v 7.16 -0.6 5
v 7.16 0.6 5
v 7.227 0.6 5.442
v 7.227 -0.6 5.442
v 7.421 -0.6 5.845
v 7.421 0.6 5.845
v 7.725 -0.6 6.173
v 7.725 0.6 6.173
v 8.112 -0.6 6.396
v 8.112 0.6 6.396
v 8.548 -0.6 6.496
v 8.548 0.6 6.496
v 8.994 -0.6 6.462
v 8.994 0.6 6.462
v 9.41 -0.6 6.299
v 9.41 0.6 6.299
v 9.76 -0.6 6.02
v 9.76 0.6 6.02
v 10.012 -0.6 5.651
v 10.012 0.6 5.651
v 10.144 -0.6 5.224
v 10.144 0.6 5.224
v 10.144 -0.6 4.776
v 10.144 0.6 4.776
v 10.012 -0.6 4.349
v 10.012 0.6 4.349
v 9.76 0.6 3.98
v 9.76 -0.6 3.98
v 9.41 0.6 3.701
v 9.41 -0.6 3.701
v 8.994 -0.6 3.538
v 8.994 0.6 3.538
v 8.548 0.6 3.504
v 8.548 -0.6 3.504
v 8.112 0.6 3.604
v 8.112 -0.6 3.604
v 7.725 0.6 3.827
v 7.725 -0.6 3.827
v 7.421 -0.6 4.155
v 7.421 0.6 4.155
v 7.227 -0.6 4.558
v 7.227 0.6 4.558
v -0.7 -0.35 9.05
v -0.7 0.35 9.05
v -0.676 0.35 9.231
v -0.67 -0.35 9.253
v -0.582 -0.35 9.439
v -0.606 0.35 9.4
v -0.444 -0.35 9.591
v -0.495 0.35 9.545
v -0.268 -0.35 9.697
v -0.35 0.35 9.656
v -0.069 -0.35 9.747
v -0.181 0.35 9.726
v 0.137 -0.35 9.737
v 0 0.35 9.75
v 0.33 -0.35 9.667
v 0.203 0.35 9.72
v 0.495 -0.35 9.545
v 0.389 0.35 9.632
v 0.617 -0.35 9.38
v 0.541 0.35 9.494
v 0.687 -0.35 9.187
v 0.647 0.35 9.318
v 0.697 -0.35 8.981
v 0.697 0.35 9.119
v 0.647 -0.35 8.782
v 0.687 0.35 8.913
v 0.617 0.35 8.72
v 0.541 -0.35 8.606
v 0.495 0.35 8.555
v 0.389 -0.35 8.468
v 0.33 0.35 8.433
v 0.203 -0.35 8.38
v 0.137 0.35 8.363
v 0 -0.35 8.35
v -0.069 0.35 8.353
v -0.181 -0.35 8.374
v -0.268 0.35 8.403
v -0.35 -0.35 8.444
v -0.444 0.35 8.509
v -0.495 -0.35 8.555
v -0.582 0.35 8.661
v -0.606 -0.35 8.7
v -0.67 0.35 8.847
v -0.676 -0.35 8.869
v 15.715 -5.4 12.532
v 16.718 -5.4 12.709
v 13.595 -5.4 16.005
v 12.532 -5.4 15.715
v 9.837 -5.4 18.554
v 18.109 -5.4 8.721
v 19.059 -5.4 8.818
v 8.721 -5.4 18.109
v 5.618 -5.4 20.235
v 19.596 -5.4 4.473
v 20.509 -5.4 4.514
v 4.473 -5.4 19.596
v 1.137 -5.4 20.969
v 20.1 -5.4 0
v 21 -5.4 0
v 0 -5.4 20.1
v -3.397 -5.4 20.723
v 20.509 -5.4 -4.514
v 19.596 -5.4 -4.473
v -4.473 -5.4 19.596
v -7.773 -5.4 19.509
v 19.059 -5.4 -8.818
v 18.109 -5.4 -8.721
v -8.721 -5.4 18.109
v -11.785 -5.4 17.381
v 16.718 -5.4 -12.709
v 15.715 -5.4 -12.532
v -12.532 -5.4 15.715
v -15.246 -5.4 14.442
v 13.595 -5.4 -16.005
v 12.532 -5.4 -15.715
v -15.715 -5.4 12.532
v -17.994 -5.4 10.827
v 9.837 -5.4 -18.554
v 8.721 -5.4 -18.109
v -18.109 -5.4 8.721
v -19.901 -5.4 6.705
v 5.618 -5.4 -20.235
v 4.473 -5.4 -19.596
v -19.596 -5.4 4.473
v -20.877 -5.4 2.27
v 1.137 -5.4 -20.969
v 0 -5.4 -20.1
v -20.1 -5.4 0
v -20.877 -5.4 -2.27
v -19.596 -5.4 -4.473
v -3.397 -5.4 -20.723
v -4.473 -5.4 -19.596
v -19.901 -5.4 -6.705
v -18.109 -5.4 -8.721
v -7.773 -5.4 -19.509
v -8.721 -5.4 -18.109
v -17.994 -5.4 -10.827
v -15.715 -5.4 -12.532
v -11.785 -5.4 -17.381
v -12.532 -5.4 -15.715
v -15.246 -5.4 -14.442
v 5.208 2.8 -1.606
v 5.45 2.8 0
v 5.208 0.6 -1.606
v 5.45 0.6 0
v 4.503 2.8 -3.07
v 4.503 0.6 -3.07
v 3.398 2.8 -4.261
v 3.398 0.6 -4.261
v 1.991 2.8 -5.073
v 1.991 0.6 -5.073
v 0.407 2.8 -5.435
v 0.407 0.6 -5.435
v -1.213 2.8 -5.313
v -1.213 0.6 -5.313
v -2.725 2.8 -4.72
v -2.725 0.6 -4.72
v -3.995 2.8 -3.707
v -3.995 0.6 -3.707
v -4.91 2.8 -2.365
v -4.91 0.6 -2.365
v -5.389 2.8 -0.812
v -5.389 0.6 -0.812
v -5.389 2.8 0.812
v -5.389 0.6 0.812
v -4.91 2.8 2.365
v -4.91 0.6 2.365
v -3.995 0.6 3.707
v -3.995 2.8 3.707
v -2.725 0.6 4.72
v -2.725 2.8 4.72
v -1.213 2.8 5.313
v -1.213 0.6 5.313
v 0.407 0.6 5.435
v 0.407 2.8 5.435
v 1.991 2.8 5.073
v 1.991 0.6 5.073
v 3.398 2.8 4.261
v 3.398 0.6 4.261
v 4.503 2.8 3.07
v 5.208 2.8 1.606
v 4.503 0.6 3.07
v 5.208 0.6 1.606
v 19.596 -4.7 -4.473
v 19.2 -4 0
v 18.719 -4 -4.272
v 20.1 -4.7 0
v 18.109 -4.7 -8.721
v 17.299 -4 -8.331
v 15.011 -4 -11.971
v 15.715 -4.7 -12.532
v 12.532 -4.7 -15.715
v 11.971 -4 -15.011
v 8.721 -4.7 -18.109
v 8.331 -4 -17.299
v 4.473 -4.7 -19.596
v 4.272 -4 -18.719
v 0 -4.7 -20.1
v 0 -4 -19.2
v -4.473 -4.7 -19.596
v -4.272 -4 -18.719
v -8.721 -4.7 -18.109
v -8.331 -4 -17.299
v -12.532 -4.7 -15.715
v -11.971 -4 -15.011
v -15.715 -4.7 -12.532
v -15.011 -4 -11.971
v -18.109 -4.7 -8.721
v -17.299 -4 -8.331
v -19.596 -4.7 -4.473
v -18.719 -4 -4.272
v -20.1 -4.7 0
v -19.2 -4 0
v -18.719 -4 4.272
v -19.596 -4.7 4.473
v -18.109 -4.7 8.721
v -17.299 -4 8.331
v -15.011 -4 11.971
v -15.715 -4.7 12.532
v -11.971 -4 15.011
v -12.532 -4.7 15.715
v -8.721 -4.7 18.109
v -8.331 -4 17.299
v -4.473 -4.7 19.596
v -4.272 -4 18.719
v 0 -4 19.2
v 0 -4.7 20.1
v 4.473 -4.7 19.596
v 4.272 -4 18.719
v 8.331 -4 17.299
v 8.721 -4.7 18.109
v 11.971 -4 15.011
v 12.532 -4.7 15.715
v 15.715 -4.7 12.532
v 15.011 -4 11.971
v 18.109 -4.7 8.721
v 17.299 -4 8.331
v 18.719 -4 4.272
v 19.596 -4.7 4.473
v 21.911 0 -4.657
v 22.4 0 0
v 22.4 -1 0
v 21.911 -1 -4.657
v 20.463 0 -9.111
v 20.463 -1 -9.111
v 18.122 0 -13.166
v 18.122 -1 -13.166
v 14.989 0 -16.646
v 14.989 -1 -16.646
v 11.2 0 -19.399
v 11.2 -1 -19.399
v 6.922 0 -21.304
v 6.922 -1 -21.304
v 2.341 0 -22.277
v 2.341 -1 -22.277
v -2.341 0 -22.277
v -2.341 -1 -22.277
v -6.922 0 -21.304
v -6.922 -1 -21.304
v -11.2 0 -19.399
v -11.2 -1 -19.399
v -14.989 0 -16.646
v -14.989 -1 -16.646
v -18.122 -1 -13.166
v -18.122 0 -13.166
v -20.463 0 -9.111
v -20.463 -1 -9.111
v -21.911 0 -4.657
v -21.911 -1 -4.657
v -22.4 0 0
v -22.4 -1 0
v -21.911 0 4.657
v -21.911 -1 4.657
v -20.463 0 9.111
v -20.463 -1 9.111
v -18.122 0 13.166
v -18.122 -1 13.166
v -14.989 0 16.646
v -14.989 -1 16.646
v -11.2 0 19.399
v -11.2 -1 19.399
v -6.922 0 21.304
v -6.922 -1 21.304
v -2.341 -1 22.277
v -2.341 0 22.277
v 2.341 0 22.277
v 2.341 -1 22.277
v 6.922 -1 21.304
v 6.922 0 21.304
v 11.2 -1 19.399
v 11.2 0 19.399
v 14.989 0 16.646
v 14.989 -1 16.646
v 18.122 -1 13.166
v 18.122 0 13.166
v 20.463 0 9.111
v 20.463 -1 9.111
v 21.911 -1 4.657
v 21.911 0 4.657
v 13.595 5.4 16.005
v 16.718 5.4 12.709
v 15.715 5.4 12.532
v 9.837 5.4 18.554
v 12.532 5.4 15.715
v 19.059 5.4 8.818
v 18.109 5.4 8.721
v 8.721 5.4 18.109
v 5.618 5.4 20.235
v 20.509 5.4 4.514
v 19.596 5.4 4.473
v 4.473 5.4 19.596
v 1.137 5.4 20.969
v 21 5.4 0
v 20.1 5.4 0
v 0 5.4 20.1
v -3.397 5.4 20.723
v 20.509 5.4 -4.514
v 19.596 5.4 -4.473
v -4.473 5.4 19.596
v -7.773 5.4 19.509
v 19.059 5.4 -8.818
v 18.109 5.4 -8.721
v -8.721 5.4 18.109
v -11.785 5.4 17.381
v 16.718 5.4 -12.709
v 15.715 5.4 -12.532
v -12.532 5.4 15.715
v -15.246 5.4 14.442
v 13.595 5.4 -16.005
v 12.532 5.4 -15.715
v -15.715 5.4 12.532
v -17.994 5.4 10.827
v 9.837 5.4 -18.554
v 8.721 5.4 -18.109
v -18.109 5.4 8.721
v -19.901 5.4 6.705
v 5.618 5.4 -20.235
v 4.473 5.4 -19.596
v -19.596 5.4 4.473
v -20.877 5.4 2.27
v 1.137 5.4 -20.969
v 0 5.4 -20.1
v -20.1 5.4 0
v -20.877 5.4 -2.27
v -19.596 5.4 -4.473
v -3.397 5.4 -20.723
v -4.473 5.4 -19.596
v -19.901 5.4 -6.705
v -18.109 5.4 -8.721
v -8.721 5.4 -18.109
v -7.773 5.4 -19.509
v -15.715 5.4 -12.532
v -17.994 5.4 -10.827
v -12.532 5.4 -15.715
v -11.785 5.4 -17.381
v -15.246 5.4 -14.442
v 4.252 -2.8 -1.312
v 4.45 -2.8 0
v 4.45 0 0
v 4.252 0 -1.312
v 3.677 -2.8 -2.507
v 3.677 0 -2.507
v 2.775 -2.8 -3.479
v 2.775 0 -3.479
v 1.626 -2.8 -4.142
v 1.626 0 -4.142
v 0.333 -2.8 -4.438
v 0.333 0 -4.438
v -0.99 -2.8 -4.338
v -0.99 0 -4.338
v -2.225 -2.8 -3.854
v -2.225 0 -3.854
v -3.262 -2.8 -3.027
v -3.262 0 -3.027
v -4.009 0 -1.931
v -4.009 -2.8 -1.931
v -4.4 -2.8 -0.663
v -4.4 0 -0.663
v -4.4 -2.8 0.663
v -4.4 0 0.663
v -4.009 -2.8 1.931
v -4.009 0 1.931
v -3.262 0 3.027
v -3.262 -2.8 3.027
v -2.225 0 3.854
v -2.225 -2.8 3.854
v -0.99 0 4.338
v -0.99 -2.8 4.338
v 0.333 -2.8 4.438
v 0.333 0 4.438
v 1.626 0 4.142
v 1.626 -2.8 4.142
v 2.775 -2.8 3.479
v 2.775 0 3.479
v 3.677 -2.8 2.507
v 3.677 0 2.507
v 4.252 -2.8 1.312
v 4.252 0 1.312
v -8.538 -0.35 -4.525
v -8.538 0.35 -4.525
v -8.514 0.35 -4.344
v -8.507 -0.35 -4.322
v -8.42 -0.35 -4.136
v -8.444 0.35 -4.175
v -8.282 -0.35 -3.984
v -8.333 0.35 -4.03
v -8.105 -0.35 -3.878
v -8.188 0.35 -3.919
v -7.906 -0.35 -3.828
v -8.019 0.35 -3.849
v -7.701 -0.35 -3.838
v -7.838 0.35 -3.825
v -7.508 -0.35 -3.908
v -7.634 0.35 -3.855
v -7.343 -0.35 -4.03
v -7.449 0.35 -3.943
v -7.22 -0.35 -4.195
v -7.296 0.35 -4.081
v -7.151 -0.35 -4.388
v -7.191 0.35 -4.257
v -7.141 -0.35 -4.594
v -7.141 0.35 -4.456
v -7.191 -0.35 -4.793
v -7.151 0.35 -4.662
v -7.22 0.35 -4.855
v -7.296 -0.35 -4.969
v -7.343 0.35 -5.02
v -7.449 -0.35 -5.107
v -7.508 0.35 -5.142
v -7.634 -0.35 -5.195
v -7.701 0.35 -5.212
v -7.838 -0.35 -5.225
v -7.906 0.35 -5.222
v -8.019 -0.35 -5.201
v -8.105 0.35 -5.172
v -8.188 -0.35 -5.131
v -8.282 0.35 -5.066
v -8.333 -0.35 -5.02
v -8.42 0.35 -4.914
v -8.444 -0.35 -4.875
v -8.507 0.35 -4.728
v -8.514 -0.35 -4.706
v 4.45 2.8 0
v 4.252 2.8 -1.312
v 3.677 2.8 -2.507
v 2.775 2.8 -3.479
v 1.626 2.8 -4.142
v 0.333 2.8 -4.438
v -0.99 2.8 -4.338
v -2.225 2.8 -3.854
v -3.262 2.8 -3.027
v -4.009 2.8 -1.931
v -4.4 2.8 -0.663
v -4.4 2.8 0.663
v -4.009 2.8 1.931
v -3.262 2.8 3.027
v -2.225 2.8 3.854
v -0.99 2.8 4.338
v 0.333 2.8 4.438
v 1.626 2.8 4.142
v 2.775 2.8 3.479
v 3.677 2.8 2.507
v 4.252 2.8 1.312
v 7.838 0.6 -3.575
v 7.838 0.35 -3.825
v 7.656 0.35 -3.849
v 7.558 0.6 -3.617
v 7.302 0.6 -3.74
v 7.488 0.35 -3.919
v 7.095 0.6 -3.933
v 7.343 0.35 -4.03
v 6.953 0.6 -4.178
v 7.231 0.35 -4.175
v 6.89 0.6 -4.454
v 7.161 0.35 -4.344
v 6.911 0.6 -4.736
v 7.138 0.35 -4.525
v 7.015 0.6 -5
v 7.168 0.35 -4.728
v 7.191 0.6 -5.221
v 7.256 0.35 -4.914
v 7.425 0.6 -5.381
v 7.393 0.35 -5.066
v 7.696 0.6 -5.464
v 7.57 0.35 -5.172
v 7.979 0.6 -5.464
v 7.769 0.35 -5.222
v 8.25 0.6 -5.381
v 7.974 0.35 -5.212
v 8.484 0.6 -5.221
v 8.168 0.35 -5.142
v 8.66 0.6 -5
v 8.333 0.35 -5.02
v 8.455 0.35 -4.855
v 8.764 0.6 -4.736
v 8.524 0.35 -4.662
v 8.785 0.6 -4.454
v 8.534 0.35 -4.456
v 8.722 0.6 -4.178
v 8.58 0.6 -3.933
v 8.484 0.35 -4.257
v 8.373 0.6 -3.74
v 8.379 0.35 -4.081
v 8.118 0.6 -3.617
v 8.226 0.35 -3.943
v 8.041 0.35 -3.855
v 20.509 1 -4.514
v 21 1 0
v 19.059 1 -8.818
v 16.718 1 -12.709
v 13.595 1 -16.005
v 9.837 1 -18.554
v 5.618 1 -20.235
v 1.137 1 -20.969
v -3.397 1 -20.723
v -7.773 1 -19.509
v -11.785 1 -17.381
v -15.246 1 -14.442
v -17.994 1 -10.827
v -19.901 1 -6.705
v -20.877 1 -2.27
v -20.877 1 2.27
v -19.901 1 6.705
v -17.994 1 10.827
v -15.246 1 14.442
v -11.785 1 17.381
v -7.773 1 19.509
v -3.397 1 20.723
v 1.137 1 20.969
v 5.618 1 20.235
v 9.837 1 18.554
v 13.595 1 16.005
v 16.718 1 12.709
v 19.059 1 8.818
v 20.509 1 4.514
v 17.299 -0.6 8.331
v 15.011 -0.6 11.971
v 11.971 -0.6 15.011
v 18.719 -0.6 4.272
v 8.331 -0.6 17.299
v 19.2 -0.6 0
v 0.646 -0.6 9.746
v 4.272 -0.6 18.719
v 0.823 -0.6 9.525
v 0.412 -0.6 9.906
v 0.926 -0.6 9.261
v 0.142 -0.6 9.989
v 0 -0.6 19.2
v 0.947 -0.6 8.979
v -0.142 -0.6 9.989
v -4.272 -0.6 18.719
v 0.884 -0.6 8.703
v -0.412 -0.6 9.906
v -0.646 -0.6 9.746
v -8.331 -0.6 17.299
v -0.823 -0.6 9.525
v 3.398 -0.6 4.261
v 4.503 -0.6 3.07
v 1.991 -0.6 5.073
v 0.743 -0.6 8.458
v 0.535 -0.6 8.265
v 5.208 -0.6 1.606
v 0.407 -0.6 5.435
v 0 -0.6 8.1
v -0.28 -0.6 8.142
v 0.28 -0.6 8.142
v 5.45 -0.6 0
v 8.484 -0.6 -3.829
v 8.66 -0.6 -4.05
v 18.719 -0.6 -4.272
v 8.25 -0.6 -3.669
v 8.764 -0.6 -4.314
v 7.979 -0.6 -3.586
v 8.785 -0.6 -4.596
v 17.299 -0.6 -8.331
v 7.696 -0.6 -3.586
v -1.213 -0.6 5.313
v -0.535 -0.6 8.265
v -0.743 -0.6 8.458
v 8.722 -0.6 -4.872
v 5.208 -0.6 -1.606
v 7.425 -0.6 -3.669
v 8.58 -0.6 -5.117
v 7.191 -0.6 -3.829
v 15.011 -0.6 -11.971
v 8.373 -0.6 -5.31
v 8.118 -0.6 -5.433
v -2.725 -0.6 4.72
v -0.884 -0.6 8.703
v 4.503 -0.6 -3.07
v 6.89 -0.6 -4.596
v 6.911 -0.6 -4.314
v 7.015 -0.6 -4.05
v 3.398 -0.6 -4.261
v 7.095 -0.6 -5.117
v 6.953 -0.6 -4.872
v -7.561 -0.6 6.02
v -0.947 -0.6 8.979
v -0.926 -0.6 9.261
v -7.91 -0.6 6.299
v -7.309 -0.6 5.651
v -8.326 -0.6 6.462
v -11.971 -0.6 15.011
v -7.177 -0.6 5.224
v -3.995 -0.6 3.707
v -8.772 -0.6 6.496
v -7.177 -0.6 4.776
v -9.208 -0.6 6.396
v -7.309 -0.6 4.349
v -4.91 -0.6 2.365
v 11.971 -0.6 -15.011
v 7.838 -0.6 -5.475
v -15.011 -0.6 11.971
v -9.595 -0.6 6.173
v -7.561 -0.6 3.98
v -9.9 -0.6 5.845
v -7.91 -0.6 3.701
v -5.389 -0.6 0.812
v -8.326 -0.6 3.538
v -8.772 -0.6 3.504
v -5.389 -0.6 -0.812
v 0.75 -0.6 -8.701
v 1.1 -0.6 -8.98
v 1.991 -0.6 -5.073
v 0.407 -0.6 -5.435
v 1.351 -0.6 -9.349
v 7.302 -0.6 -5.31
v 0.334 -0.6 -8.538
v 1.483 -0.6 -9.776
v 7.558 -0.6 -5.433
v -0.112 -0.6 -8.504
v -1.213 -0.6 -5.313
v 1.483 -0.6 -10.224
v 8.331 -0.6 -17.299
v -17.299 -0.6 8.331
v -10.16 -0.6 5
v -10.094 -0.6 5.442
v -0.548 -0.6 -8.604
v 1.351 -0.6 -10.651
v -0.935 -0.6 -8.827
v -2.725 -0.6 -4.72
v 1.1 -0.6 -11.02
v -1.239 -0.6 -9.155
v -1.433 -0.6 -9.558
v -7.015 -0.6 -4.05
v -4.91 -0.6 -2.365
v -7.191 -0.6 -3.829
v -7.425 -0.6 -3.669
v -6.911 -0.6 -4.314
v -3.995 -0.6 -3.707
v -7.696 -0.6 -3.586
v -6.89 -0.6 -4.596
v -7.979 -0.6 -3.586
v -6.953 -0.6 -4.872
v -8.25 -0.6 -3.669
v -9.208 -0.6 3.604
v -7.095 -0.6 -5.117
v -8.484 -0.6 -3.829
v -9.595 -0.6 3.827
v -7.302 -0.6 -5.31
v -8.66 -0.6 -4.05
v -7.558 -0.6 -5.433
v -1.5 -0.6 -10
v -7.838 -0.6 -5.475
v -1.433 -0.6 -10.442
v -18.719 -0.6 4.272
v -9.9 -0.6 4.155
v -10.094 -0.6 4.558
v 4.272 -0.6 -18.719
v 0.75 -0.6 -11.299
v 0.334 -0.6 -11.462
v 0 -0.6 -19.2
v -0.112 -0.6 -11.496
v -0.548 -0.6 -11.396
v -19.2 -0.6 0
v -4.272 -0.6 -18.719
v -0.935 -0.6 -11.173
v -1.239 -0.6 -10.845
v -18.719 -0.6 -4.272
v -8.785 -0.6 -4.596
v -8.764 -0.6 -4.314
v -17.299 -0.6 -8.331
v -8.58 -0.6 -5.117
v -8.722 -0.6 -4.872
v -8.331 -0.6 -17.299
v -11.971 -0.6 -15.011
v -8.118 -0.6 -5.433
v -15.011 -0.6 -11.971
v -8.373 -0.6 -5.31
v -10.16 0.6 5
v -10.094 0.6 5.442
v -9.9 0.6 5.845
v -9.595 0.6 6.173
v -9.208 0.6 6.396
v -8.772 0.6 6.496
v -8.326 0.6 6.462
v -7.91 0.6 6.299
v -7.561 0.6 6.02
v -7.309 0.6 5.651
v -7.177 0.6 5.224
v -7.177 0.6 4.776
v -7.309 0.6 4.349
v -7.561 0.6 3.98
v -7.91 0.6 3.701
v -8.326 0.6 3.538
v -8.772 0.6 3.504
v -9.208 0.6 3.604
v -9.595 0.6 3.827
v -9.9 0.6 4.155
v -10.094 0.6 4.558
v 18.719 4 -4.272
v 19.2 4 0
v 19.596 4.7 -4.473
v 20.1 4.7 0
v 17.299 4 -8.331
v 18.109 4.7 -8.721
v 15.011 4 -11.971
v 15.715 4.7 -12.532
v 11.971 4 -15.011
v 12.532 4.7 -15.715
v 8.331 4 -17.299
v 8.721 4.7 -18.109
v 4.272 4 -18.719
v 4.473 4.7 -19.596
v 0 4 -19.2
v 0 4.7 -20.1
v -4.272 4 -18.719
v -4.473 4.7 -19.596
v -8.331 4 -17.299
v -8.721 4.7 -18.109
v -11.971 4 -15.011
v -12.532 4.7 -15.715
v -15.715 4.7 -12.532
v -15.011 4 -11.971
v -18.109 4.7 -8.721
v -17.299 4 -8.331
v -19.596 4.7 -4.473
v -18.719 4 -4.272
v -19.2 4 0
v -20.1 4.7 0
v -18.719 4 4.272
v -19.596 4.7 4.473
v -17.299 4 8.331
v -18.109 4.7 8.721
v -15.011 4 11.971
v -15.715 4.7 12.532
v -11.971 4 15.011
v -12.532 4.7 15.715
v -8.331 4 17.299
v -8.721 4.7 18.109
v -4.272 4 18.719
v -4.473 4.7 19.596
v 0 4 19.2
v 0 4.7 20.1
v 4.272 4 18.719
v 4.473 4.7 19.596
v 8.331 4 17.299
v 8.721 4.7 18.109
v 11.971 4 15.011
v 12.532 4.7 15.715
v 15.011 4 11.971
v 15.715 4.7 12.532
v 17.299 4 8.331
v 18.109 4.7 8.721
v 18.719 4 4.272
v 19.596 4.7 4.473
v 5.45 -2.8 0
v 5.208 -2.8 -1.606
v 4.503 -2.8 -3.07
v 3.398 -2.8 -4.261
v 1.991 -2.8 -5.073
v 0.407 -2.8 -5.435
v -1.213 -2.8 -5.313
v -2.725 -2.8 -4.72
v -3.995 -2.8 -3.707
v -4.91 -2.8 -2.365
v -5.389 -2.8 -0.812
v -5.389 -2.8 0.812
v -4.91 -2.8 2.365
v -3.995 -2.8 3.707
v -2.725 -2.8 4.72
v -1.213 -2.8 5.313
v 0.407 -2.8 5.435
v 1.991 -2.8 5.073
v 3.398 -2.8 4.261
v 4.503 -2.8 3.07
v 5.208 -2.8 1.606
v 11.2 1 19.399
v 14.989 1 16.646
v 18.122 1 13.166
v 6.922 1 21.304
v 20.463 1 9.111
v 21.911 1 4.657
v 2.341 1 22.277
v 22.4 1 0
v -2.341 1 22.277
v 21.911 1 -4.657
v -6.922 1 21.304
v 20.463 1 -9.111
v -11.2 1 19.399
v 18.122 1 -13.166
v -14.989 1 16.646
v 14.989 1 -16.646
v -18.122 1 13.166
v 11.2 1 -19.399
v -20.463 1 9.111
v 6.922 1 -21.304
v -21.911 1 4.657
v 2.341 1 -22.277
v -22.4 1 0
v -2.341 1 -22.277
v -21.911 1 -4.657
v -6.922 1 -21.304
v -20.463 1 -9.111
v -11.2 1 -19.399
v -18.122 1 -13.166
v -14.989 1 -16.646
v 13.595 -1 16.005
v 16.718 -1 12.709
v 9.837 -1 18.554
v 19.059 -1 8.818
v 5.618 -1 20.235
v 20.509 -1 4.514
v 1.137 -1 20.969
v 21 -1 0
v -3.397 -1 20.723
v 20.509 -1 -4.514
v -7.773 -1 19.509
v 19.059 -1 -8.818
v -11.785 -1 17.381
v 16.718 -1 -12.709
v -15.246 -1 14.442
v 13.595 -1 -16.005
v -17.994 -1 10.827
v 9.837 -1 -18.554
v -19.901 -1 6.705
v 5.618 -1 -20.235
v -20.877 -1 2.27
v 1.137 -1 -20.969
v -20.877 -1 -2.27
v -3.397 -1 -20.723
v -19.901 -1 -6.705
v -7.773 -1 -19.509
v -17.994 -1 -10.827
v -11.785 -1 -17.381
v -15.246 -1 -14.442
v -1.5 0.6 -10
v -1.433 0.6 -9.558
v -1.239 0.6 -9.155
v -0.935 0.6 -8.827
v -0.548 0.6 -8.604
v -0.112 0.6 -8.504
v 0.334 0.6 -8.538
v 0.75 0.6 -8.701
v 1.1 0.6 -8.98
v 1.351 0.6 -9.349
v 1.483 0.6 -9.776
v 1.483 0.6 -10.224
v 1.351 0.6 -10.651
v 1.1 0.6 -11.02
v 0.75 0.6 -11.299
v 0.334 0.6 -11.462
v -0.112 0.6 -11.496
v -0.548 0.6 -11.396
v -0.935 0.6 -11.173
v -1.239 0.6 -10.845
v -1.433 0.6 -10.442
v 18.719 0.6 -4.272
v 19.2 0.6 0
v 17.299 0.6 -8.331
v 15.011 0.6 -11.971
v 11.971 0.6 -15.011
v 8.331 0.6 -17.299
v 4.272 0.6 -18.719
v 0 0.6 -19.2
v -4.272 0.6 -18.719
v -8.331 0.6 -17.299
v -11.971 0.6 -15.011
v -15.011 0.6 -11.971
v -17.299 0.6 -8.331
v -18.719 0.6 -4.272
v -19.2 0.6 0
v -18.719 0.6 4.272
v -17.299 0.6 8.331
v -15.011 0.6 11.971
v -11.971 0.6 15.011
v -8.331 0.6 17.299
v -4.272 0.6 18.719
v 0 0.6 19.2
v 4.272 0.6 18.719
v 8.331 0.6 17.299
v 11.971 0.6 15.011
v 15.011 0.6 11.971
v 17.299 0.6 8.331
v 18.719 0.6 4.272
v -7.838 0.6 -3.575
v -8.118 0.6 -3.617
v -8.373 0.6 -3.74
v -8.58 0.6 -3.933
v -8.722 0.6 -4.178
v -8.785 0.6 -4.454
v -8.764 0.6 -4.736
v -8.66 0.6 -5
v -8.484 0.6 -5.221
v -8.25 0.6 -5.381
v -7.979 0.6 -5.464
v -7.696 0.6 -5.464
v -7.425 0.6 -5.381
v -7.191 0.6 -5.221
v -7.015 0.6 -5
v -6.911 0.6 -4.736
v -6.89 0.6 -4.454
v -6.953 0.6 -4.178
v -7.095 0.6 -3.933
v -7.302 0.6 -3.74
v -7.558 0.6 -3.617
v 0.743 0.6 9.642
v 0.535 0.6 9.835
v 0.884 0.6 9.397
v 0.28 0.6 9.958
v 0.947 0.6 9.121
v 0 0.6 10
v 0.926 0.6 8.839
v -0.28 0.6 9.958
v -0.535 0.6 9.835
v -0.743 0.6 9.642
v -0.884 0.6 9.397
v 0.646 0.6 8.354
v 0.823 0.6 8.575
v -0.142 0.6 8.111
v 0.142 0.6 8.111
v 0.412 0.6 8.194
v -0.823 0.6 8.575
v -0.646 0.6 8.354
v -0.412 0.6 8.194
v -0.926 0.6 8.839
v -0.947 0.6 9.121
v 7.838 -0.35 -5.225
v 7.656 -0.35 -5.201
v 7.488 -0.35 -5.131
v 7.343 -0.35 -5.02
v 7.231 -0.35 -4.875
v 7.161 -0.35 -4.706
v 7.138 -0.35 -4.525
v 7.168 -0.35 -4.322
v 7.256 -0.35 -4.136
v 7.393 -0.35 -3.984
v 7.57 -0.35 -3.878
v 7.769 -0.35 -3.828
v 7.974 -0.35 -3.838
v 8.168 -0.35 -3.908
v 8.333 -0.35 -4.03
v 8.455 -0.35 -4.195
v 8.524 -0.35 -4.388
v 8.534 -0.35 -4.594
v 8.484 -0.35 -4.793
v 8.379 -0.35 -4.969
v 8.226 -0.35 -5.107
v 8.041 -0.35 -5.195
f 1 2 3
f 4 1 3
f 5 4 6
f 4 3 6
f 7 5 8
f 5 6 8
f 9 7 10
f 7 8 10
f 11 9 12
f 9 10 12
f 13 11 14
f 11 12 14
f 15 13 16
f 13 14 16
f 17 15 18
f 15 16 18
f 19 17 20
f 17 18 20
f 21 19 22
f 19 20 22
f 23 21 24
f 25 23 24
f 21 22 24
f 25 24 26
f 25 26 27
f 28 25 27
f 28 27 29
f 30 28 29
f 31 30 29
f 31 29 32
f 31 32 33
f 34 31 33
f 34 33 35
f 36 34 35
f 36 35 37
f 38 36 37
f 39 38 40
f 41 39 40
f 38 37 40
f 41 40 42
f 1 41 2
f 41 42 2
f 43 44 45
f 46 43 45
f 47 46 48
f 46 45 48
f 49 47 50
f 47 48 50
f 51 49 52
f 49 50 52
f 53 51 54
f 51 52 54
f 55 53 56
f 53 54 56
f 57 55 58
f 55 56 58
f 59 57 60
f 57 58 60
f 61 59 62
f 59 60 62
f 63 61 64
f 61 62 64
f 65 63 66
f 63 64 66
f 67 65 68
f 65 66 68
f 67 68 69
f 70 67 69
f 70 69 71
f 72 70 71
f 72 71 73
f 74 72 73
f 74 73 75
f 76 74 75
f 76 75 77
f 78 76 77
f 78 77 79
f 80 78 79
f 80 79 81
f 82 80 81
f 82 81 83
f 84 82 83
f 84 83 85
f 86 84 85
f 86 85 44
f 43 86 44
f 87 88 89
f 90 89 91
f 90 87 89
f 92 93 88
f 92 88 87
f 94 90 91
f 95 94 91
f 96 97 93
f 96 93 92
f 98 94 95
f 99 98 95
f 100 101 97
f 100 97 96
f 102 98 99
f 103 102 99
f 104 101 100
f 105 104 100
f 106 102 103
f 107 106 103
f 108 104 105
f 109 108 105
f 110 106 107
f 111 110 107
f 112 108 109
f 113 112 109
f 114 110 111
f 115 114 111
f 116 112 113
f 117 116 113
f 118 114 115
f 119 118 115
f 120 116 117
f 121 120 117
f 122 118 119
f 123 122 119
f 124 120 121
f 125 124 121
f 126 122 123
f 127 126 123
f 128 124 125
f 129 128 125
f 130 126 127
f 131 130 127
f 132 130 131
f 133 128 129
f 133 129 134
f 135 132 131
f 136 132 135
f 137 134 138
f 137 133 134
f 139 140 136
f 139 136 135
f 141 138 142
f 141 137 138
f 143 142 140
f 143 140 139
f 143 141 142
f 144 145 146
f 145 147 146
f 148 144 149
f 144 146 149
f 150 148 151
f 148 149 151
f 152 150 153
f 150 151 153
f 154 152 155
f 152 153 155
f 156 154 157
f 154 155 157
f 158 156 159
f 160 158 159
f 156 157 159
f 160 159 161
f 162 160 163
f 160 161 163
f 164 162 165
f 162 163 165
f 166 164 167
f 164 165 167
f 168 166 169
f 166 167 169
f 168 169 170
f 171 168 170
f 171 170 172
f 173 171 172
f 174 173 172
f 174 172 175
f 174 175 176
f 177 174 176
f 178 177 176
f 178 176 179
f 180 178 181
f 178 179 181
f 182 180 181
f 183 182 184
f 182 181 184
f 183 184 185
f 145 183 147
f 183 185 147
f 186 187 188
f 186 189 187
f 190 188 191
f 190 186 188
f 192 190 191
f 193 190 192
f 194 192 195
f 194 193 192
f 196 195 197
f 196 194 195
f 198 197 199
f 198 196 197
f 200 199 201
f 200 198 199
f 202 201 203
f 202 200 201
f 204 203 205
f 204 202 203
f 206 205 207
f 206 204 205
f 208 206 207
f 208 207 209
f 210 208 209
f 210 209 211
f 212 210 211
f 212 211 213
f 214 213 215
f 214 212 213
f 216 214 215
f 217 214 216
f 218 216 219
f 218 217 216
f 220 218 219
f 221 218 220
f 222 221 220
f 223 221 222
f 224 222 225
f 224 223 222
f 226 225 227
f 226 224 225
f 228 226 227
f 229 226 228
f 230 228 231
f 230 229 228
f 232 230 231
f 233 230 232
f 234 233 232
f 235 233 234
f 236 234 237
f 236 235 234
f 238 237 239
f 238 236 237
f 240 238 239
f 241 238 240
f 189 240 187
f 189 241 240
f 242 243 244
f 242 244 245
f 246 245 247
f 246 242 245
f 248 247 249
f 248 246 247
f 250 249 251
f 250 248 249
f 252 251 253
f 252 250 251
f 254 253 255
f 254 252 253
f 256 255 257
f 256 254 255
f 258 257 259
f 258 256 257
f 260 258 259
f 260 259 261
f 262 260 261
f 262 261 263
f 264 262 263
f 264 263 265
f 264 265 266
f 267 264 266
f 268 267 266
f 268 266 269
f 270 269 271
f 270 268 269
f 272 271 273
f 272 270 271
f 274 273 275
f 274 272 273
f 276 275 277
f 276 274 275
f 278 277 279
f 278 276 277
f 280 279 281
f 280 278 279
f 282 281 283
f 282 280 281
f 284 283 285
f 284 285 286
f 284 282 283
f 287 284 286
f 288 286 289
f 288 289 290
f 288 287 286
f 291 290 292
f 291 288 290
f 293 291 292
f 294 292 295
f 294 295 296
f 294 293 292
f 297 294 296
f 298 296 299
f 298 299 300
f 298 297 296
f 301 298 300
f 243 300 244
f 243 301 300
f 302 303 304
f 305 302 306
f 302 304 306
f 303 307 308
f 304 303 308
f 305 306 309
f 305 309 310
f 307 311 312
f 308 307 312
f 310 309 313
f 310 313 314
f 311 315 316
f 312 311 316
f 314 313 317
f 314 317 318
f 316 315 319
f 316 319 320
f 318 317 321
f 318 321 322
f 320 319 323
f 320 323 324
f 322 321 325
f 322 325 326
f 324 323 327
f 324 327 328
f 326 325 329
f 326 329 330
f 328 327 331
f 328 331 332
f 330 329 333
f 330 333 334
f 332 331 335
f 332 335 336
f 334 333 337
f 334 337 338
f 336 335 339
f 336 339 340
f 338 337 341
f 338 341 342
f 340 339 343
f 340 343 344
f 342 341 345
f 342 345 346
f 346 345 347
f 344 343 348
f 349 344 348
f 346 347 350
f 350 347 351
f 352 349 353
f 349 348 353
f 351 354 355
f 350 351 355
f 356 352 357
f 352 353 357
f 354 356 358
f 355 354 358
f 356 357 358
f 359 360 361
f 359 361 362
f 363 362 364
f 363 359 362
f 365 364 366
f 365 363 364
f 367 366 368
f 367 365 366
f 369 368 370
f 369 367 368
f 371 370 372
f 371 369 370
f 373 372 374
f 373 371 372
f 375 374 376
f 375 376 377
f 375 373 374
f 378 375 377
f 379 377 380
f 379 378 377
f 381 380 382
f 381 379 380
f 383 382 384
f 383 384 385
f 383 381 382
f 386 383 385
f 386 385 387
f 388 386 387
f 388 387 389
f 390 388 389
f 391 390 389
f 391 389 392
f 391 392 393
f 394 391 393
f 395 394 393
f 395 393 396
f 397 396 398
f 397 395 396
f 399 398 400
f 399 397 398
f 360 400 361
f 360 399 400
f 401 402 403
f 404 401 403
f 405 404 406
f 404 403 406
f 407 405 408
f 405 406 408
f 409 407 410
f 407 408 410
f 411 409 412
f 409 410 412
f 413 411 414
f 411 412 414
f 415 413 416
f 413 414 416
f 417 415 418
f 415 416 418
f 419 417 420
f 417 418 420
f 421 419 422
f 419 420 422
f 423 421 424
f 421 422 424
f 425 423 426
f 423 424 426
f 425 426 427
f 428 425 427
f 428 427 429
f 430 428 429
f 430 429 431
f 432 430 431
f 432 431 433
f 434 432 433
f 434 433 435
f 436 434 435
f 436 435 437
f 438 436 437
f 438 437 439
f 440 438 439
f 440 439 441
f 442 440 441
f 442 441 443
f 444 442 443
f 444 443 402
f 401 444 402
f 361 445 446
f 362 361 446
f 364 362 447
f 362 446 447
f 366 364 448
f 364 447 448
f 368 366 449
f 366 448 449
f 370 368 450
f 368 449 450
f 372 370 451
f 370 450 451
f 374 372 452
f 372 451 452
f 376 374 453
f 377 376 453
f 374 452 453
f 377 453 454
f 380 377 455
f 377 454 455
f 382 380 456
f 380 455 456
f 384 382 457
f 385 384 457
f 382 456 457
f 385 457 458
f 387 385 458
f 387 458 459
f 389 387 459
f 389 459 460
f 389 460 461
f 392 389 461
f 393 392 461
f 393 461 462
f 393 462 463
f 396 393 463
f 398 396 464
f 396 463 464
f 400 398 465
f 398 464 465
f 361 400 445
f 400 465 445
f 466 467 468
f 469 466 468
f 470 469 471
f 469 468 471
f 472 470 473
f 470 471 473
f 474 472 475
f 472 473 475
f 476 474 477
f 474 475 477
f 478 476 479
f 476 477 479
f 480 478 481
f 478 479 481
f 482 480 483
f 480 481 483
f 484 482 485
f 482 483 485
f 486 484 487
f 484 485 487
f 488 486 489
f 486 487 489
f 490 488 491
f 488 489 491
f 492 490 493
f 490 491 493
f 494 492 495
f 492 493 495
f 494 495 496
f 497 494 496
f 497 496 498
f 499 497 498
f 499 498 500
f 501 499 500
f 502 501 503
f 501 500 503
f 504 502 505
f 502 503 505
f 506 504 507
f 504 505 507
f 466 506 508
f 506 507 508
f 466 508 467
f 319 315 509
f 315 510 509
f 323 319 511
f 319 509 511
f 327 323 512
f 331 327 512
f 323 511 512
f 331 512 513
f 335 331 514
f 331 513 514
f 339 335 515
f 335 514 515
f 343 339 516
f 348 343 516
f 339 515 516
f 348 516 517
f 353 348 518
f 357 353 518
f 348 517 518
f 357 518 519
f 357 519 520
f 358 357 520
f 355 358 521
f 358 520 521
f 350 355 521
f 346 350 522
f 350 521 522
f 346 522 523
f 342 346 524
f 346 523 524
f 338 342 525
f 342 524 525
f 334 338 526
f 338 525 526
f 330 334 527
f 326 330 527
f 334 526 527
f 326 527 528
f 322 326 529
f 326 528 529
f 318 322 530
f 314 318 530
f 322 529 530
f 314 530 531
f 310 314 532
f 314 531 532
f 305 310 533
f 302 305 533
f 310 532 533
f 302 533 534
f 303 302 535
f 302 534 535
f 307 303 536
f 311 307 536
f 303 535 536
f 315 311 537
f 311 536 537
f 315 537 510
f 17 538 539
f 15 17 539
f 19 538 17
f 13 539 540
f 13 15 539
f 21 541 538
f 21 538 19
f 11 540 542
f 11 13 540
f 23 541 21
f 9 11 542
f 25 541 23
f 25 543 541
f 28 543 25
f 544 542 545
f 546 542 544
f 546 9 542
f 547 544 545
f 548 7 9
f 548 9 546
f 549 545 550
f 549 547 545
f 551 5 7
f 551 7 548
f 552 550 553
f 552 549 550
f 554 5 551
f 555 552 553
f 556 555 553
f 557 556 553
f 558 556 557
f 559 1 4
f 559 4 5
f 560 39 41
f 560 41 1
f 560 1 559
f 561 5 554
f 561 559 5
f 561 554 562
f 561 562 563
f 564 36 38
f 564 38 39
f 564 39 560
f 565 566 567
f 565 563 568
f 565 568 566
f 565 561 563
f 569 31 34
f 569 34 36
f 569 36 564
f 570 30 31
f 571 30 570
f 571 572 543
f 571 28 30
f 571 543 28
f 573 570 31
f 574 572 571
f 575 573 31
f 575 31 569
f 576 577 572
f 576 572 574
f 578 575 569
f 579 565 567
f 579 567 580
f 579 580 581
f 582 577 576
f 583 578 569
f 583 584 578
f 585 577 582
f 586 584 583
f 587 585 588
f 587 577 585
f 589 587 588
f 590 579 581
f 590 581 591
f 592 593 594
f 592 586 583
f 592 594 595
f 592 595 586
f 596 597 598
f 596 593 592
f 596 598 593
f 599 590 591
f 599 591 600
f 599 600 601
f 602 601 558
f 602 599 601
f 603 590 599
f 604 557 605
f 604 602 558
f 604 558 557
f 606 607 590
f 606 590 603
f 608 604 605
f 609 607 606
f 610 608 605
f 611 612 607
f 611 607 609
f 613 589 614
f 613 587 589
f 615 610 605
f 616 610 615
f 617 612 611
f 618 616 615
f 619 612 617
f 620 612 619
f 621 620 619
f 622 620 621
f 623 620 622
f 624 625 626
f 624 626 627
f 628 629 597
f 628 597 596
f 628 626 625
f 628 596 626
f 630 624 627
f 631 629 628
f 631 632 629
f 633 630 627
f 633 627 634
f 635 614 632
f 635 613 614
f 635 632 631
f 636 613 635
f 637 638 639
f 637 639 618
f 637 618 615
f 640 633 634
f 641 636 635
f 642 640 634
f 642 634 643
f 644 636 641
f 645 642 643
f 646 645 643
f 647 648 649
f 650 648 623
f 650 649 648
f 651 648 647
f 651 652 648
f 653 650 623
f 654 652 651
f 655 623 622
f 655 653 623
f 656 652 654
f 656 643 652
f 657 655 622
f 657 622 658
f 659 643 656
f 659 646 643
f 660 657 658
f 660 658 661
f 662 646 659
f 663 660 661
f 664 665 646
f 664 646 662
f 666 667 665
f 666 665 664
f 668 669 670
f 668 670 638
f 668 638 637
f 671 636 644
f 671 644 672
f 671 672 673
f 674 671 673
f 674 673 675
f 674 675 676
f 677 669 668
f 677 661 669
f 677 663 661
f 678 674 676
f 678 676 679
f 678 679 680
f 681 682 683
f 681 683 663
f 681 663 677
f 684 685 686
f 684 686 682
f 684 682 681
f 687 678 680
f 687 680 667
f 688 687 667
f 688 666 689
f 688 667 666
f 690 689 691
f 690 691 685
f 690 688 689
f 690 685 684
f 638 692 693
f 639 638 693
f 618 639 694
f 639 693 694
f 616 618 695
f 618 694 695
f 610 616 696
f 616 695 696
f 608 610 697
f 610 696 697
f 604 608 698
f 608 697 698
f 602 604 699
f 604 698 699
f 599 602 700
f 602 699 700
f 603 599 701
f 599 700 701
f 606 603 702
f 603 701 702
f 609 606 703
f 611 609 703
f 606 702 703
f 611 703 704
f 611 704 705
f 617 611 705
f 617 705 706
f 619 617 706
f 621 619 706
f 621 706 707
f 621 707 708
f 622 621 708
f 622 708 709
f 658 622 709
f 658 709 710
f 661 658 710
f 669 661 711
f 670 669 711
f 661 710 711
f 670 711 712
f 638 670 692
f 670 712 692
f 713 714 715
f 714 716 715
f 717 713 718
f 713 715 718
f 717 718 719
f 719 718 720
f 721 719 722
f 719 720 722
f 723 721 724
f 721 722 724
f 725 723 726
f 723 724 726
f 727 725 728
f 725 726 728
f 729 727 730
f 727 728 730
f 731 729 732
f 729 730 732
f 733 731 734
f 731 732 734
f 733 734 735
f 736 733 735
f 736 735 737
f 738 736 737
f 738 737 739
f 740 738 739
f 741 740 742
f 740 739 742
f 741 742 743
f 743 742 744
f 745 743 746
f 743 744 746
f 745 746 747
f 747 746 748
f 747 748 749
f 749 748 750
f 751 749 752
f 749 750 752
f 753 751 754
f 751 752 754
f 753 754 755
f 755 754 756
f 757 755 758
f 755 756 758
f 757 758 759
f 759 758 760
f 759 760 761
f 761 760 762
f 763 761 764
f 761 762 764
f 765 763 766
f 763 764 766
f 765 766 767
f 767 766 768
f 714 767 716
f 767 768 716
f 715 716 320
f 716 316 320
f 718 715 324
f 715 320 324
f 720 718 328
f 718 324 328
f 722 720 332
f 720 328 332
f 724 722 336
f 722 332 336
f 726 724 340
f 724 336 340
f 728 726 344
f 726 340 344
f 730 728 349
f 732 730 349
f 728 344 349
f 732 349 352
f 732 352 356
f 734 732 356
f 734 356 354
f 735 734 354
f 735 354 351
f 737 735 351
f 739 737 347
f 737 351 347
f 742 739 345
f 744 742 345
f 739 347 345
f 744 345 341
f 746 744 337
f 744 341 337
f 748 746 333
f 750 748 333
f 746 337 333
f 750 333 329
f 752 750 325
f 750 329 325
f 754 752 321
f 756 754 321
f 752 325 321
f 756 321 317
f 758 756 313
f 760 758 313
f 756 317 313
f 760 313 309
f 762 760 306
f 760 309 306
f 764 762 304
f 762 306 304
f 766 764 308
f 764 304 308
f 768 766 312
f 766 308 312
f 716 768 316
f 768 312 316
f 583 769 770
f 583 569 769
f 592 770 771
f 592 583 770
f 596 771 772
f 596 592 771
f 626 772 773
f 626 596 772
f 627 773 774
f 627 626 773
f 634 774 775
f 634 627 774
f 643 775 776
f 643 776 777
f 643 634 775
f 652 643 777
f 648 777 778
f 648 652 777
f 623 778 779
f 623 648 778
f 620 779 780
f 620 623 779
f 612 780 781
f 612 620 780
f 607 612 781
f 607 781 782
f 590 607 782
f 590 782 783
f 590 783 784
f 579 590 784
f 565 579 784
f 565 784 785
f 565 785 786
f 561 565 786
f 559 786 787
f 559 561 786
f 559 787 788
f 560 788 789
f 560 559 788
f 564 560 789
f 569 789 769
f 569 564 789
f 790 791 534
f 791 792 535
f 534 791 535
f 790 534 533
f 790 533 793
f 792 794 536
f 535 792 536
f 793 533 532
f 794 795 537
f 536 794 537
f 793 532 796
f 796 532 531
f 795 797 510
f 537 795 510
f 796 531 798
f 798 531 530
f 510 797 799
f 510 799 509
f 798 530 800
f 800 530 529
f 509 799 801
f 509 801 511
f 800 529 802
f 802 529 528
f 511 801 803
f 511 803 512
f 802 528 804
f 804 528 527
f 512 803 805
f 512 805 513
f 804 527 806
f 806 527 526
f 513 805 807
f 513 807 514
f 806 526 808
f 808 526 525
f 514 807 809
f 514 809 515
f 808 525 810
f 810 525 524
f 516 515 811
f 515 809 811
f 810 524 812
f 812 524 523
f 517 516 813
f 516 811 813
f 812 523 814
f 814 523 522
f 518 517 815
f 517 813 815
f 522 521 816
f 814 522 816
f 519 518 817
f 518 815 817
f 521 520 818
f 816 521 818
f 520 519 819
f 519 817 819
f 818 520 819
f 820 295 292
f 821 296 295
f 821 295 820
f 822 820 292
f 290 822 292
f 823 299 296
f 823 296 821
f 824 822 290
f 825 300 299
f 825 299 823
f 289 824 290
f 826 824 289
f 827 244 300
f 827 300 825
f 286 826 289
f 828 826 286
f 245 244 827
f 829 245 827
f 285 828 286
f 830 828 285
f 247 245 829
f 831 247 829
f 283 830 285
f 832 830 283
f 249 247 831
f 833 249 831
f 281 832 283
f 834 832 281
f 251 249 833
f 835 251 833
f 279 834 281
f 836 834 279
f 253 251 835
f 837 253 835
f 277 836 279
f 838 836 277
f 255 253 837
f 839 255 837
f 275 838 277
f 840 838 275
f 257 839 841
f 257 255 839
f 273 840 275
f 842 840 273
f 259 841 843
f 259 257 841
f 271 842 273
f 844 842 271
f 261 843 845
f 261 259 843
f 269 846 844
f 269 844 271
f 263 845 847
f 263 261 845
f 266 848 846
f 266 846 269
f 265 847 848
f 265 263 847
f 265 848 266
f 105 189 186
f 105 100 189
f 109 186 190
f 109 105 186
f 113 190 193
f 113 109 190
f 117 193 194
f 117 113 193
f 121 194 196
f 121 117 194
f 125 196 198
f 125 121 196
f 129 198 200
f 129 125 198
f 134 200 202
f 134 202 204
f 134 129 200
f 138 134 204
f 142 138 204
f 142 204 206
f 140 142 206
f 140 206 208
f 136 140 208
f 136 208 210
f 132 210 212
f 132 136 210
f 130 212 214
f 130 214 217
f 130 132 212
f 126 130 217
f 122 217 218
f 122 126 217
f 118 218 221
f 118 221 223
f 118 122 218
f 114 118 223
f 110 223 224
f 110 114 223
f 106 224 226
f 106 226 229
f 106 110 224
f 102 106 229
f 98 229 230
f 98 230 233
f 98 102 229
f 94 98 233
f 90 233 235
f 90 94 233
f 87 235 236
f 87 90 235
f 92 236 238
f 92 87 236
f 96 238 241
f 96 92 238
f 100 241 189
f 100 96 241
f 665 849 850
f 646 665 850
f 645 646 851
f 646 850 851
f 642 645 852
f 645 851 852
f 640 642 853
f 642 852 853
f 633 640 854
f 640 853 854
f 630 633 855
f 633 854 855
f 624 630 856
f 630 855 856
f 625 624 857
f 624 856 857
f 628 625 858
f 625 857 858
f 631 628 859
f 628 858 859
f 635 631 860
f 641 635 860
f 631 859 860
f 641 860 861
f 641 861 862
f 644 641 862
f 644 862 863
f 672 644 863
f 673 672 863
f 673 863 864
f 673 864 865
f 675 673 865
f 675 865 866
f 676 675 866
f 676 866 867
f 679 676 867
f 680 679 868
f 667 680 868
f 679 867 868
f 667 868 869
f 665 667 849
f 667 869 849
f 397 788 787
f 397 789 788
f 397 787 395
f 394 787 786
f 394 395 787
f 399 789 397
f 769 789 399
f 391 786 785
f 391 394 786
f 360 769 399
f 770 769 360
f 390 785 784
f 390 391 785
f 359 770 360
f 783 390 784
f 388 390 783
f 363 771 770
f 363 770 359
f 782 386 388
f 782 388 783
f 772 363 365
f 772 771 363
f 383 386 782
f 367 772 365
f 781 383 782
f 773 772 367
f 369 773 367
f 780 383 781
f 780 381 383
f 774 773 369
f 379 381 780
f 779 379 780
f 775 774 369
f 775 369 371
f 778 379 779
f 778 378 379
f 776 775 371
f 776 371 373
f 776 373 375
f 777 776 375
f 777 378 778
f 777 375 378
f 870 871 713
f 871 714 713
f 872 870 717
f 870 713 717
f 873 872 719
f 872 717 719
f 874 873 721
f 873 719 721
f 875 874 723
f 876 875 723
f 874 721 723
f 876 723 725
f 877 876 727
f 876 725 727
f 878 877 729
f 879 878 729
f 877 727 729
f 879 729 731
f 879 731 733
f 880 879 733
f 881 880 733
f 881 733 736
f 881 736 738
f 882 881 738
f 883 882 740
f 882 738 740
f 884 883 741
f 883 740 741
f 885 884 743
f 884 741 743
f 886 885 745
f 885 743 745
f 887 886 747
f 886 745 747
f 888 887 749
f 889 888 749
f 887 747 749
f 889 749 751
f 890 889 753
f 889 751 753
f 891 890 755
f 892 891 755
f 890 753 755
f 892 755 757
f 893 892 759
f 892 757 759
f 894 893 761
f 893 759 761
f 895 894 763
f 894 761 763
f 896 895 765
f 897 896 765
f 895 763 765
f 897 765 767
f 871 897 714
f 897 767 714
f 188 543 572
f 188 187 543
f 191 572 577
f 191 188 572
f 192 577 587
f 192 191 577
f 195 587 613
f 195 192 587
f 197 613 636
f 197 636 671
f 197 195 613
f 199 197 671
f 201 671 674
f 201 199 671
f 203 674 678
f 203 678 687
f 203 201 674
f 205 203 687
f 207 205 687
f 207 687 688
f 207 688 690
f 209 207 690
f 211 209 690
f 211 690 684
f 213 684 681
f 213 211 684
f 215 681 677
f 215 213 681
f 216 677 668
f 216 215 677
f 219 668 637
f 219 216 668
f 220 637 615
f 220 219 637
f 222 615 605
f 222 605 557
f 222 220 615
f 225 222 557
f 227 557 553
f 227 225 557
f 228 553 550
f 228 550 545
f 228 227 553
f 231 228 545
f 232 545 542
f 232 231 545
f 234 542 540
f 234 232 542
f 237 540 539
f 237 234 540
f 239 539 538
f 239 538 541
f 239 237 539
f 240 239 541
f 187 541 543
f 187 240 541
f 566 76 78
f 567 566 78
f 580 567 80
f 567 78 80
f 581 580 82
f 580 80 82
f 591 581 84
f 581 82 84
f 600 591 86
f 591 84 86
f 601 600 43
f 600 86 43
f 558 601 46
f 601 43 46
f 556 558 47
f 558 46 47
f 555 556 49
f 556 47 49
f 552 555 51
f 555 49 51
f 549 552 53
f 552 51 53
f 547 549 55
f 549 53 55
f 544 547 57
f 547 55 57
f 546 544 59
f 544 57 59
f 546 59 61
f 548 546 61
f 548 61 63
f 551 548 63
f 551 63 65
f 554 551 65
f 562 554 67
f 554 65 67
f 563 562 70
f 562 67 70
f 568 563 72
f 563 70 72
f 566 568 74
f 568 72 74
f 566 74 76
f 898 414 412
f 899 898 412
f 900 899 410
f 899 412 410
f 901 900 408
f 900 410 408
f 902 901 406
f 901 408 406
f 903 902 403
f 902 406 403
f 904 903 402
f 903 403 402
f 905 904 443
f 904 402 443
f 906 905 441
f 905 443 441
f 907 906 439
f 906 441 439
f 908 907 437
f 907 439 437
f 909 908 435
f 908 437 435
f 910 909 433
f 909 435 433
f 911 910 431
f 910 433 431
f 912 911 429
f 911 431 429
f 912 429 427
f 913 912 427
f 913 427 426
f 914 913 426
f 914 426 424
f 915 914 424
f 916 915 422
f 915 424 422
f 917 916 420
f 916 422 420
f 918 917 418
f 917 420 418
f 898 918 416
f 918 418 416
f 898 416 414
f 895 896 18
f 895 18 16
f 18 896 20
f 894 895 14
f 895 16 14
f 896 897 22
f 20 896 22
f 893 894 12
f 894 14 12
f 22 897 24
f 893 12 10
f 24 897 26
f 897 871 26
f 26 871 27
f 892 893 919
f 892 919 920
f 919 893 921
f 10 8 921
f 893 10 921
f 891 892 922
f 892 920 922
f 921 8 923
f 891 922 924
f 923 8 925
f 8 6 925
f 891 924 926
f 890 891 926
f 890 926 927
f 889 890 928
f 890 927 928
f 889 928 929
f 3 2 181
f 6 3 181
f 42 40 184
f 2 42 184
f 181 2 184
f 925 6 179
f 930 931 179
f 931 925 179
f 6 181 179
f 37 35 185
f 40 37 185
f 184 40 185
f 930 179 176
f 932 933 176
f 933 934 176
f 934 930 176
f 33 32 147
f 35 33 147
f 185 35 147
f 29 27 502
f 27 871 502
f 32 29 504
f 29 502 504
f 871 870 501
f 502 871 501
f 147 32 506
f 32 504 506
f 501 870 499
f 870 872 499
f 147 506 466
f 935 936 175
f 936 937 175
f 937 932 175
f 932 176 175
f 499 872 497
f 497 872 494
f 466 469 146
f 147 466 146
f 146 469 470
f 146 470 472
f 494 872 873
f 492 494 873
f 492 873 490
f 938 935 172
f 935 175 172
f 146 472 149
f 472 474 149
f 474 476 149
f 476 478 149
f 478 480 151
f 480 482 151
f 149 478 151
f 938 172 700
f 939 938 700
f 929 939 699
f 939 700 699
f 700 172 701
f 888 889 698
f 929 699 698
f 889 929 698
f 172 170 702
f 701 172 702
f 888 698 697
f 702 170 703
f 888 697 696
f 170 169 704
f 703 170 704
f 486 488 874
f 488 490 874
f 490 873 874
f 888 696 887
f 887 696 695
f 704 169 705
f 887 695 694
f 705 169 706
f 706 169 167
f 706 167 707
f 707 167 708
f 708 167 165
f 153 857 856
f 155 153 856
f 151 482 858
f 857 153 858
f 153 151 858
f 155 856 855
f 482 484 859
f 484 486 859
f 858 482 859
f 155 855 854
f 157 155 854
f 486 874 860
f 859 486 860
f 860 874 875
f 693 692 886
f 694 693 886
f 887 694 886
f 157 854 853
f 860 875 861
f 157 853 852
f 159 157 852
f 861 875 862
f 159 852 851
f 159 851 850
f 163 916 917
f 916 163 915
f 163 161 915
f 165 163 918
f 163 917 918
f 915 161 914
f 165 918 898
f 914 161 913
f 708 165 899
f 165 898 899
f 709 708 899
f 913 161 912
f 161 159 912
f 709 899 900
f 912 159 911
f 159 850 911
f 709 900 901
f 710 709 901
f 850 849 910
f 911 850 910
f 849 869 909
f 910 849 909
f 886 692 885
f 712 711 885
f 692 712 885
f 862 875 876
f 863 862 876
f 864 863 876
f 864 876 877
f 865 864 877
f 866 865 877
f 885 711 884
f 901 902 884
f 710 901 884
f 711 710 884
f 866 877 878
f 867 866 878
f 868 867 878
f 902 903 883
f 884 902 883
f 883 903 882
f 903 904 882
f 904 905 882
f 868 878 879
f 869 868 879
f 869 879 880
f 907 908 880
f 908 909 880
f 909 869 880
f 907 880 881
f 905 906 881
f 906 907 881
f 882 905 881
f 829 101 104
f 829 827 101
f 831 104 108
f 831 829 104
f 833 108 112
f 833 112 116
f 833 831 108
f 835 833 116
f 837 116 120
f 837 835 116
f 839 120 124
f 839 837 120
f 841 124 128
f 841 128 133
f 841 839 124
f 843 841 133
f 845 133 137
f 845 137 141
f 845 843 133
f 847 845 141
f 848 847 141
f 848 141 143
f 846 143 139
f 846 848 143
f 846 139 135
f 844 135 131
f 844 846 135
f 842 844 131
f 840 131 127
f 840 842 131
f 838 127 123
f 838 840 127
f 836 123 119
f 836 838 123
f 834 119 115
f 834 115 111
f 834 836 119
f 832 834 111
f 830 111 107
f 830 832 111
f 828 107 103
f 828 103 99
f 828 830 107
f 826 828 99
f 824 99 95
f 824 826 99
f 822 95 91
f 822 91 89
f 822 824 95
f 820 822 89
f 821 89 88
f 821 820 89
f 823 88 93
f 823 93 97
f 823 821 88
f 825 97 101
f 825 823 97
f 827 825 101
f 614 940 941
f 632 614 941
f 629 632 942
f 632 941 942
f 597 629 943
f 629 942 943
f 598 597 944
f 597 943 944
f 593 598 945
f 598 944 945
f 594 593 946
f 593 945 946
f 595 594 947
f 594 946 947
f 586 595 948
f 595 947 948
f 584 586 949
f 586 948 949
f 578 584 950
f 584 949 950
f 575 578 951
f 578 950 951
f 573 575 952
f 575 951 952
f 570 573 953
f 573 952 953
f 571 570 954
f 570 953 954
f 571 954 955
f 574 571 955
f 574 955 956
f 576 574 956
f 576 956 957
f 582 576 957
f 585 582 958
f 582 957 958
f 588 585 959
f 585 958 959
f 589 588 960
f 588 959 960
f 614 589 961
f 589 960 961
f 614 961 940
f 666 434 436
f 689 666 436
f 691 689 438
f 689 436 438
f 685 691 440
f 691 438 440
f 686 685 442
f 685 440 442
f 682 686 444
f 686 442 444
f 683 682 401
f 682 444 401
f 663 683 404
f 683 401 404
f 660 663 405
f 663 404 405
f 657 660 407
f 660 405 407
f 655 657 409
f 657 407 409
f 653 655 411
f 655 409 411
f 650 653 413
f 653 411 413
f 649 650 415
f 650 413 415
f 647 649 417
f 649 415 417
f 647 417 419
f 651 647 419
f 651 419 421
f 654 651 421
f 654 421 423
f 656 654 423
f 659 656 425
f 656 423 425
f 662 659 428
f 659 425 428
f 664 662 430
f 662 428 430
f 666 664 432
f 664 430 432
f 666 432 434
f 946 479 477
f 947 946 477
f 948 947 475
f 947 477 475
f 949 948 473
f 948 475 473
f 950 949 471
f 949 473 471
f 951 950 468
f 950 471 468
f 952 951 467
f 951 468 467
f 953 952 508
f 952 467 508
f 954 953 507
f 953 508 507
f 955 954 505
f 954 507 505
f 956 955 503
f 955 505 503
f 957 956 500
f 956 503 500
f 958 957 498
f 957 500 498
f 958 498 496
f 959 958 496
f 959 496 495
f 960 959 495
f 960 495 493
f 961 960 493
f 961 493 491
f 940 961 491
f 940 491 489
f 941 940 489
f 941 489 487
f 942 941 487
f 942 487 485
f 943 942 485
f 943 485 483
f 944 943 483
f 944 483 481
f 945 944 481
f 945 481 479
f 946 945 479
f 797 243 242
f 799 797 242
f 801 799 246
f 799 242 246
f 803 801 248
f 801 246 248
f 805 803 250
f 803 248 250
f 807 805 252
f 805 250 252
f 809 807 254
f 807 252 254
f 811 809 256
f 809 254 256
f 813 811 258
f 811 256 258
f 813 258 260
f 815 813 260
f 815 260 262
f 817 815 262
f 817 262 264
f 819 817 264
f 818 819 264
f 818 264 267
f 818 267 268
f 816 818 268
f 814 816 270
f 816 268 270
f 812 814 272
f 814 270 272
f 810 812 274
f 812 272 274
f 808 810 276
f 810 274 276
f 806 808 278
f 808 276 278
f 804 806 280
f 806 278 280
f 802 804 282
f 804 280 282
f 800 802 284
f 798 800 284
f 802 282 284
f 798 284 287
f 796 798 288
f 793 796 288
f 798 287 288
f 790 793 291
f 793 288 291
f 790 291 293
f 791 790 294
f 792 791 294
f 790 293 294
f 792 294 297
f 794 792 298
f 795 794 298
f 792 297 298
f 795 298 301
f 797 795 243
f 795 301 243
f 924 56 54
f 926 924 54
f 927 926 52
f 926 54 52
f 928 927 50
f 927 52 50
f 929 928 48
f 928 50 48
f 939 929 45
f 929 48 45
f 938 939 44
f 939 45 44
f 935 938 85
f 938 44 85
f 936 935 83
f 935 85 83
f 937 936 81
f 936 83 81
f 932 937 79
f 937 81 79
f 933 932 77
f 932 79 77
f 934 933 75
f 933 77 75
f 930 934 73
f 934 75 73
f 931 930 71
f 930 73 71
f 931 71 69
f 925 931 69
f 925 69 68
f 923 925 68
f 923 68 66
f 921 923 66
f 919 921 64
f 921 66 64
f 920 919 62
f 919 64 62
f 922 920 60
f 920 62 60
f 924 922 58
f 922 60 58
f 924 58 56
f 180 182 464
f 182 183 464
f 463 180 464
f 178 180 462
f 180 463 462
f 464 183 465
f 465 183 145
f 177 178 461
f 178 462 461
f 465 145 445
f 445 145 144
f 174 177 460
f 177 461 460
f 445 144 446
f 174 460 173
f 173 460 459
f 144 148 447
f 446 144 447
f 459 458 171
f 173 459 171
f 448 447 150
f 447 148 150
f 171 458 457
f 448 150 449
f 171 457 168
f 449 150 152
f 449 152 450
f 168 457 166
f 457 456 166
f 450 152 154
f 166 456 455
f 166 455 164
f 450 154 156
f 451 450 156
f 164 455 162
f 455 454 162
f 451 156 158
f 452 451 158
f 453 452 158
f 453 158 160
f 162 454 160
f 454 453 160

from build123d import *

# Parameters (mm, degrees)
SKETCH3_R          = 1.5
SKETCH3_R_2        = 0.7
CUT_EXTRUDE1_DEPTH = 1.2


with BuildPart() as part:
    # Sketch1 → Revolve1 (revolve)
    with BuildSketch(Plane.XY):
        Polygon((4.45, 0), (4.45, 2.8), (5.45, 2.8), (5.45, 0.6), (19.2, 0.6), (19.2, 4), (20.1, 4.7), (20.1, 5.4), (21, 5.4), (21, 1), (22.4, 1), (22.4, 0), align=None)
    revolve1 = revolve(axis=Axis((0, -5.4, 0), (0, 1, 0)))

    # Mirror1: Revolve1 across plane
    add(revolve1.mirror(Plane(origin=(22.4, 0, 0), x_dir=(0, 0, 1), z_dir=(0, -1, 0))))

    # Sketch3 → Cut-Extrude1 (cut)
    with BuildSketch(Plane(origin=(0, 0.6, 0), x_dir=(1, 0, 0), z_dir=(0, 1, 0))):
        with Locations(Location((0, 10, 0), (0, 0, 180))):
            Circle(SKETCH3_R)
        with Locations(Location((-8.660254038, -5, 0), (0, 0, 180))):
            Circle(SKETCH3_R)
        with Locations(Location((8.660254038, -5, 0), (0, 0, 180))):
            Circle(SKETCH3_R)
        with Locations(Location((-7.837529904, 4.525, 0), (0, 0, 180))):
            Circle(SKETCH3_R_2)
        with Locations(Location((7.837529904, 4.525, 0), (0, 0, 180))):
            Circle(SKETCH3_R_2)
        with Locations(Location((0, -9.05, 0), (0, 0, 180))):
            Circle(SKETCH3_R_2)
    extrude(amount=-CUT_EXTRUDE1_DEPTH, mode=Mode.SUBTRACT)

    # Cut-Extrude2 cone 1 section (through the dimple's axis) → Cut-Extrude2 (revolve, cut)
    with BuildSketch(Plane(origin=(0, 0.6, 9.05), x_dir=(0, 0, 1), z_dir=(1, 0, 0))):
        Polygon((0, 0), (0.95, 0), (0, 0.95), align=None)
    revolve(axis=Axis((0, 0.6, 9.05), (0, -1, 0)), mode=Mode.SUBTRACT)

    # Cut-Extrude2 cone 2 section (through the dimple's axis) → Cut-Extrude2 cone 2 (revolve, cut)
    with BuildSketch(Plane(origin=(7.837529904, 0.6, -4.525), x_dir=(0, 0, 1), z_dir=(1, 0, 0))):
        Polygon((0, 0), (0.95, 0), (0, 0.95), align=None)
    revolve(axis=Axis((7.837529904, 0.6, -4.525), (0, -1, 0)), mode=Mode.SUBTRACT)

    # Cut-Extrude2 cone 3 section (through the dimple's axis) → Cut-Extrude2 cone 3 (revolve, cut)
    with BuildSketch(Plane(origin=(-7.837529904, 0.6, -4.525), x_dir=(0, 0, 1), z_dir=(1, 0, 0))):
        Polygon((0, 0), (0.95, 0), (0, 0.95), align=None)
    revolve(axis=Axis((-7.837529904, 0.6, -4.525), (0, -1, 0)), mode=Mode.SUBTRACT)

    # Cut-Extrude3 cone 1 section (through the dimple's axis) → Cut-Extrude3 (revolve, cut)
    with BuildSketch(Plane(origin=(7.837529904, -0.6, -4.525), x_dir=(0, 0, -1), z_dir=(1, 0, 0))):
        Polygon((0, 0), (0.95, 0), (0, 0.95), align=None)
    revolve(axis=Axis((7.837529904, -0.6, -4.525), (0, 1, 0)), mode=Mode.SUBTRACT)

    # Cut-Extrude3 cone 2 section (through the dimple's axis) → Cut-Extrude3 cone 2 (revolve, cut)
    with BuildSketch(Plane(origin=(0, -0.6, 9.05), x_dir=(0, 0, -1), z_dir=(1, 0, 0))):
        Polygon((0, 0), (0.95, 0), (0, 0.95), align=None)
    revolve(axis=Axis((0, -0.6, 9.05), (0, 1, 0)), mode=Mode.SUBTRACT)

    # Cut-Extrude3 cone 3 section (through the dimple's axis) → Cut-Extrude3 cone 3 (revolve, cut)
    with BuildSketch(Plane(origin=(-7.837529904, -0.6, -4.525), x_dir=(0, 0, -1), z_dir=(1, 0, 0))):
        Polygon((0, 0), (0.95, 0), (0, 0.95), align=None)
    revolve(axis=Axis((-7.837529904, -0.6, -4.525), (0, 1, 0)), mode=Mode.SUBTRACT)


solid = part.part
